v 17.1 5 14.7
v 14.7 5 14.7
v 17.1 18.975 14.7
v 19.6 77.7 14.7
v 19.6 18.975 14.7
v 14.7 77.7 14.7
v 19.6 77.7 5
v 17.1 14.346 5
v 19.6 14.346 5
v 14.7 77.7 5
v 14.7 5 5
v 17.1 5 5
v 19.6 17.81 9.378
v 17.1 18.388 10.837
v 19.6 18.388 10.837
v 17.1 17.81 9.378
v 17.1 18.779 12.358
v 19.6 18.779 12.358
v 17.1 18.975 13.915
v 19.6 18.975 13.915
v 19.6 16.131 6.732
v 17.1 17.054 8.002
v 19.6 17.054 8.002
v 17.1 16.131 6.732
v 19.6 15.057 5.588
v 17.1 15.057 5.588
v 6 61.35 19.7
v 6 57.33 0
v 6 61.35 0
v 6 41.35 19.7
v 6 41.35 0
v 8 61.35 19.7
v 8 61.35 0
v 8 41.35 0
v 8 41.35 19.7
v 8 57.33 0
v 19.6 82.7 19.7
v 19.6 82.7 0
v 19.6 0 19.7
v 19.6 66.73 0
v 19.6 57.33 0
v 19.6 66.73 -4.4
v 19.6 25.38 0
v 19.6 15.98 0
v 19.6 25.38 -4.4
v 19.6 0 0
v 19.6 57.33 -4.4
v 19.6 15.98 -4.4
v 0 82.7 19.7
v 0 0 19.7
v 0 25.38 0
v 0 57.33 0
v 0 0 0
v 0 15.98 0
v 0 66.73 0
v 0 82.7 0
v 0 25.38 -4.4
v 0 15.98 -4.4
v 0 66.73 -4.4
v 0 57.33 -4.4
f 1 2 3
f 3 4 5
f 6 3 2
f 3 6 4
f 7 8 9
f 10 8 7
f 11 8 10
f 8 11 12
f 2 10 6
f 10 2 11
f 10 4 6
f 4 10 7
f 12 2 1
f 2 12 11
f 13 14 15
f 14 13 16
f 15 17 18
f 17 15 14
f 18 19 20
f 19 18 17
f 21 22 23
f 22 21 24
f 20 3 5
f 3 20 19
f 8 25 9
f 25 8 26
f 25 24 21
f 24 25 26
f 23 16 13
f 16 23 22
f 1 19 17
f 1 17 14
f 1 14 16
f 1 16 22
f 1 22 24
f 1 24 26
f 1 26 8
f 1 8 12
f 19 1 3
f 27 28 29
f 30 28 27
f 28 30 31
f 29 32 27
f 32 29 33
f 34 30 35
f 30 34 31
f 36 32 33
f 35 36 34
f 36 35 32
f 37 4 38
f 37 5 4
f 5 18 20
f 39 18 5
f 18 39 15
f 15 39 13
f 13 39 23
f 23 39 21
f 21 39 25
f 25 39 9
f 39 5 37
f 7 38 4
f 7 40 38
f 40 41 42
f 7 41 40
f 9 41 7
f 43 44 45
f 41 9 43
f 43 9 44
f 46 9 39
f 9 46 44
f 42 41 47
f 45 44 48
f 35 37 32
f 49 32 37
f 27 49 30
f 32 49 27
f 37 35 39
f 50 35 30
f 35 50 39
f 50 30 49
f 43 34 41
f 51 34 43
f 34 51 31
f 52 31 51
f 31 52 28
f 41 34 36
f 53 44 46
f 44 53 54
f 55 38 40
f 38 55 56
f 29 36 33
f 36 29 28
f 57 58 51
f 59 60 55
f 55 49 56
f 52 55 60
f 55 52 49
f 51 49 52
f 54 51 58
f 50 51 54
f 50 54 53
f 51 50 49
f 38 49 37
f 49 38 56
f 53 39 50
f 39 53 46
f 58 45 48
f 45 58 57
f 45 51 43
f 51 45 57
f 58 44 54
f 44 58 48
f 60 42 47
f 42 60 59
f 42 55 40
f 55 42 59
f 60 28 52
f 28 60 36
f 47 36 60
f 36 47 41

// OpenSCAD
$fn=48;
translate([0,0,0])
{
union()
{
    difference()
    {
        cube(size = [19.60, 82.70, 19.70], center = false); 
        difference()
        {
            translate(v = [19.60, 41.35, 9.85])
            {
                cube(size = [9.80, 72.70, 9.70], center = true); 
            }
            translate(v = [19.60, 6.50, 14.70])
            {
                rotate([0.00, 90.00, 0.00])
                {
                    cylinder(center = true, r1 = 12.5, r2 = 12.5, h = 5, $fn = 50);
                }
            }
        }
        translate(v = [1.00, 51.35, -10.30])
        {
            translate(v = [6.00, 0.00, 1.00])
            {
                union()
                {
                    hull()
                    {
                        rotate([90.00, 0.00, 0.00])
                        {
                            difference()
                            {
                                cylinder(center = true, r1 = 1, r2 = 1, h = 20);
                                translate(v = [-2.00, 0.00, -10.00])
                                {
                                    cube(size = [4.00, 2.00, 20.00], center = false); 
                                }
                            }
                        }
                        translate(v = [-1.00, -10.00, 0.00])
                        {
                            cube(size = [2.00, 20.00, 39.00], center = false); 
                        }
                    }
                    translate(v = [-6.00, -10.00, 34.00])
                    {
                        difference()
                        {
                            cube(size = [5.00, 20.00, 5.00], center = false); 
                            translate(v = [0.00, 20.00, 0.00])
                            {
                                rotate([90.00, 0.00, 0.00])
                                {
                                    cylinder(center = false, r1 = 5, r2 = 5, h = 20, $fn = 100);
                                }
                            }
                        }
                    }
                    mirror([2.00, 0.00, 0.00])
                    {
                        translate(v = [-6.00, -10.00, 34.00])
                        {
                            difference()
                            {
                                cube(size = [5.00, 20.00, 5.00], center = false); 
                                translate(v = [0.00, 20.00, 0.00])
                                {
                                    rotate([90.00, 0.00, 0.00])
                                    {
                                        cylinder(center = false, r1 = 5, r2 = 5, h = 20, $fn = 100);
                                    }
                                }
                            }
                        }
                    }
                }
            }
        }
    }
    translate(v = [0.00, 15.98, -4.40])
    {
        cube(size = [19.60, 9.40, 4.40], center = false); 
    }
    translate(v = [0.00, 57.33, -4.40])
    {
        cube(size = [19.60, 9.40, 4.40], center = false); 
    }
}

}
